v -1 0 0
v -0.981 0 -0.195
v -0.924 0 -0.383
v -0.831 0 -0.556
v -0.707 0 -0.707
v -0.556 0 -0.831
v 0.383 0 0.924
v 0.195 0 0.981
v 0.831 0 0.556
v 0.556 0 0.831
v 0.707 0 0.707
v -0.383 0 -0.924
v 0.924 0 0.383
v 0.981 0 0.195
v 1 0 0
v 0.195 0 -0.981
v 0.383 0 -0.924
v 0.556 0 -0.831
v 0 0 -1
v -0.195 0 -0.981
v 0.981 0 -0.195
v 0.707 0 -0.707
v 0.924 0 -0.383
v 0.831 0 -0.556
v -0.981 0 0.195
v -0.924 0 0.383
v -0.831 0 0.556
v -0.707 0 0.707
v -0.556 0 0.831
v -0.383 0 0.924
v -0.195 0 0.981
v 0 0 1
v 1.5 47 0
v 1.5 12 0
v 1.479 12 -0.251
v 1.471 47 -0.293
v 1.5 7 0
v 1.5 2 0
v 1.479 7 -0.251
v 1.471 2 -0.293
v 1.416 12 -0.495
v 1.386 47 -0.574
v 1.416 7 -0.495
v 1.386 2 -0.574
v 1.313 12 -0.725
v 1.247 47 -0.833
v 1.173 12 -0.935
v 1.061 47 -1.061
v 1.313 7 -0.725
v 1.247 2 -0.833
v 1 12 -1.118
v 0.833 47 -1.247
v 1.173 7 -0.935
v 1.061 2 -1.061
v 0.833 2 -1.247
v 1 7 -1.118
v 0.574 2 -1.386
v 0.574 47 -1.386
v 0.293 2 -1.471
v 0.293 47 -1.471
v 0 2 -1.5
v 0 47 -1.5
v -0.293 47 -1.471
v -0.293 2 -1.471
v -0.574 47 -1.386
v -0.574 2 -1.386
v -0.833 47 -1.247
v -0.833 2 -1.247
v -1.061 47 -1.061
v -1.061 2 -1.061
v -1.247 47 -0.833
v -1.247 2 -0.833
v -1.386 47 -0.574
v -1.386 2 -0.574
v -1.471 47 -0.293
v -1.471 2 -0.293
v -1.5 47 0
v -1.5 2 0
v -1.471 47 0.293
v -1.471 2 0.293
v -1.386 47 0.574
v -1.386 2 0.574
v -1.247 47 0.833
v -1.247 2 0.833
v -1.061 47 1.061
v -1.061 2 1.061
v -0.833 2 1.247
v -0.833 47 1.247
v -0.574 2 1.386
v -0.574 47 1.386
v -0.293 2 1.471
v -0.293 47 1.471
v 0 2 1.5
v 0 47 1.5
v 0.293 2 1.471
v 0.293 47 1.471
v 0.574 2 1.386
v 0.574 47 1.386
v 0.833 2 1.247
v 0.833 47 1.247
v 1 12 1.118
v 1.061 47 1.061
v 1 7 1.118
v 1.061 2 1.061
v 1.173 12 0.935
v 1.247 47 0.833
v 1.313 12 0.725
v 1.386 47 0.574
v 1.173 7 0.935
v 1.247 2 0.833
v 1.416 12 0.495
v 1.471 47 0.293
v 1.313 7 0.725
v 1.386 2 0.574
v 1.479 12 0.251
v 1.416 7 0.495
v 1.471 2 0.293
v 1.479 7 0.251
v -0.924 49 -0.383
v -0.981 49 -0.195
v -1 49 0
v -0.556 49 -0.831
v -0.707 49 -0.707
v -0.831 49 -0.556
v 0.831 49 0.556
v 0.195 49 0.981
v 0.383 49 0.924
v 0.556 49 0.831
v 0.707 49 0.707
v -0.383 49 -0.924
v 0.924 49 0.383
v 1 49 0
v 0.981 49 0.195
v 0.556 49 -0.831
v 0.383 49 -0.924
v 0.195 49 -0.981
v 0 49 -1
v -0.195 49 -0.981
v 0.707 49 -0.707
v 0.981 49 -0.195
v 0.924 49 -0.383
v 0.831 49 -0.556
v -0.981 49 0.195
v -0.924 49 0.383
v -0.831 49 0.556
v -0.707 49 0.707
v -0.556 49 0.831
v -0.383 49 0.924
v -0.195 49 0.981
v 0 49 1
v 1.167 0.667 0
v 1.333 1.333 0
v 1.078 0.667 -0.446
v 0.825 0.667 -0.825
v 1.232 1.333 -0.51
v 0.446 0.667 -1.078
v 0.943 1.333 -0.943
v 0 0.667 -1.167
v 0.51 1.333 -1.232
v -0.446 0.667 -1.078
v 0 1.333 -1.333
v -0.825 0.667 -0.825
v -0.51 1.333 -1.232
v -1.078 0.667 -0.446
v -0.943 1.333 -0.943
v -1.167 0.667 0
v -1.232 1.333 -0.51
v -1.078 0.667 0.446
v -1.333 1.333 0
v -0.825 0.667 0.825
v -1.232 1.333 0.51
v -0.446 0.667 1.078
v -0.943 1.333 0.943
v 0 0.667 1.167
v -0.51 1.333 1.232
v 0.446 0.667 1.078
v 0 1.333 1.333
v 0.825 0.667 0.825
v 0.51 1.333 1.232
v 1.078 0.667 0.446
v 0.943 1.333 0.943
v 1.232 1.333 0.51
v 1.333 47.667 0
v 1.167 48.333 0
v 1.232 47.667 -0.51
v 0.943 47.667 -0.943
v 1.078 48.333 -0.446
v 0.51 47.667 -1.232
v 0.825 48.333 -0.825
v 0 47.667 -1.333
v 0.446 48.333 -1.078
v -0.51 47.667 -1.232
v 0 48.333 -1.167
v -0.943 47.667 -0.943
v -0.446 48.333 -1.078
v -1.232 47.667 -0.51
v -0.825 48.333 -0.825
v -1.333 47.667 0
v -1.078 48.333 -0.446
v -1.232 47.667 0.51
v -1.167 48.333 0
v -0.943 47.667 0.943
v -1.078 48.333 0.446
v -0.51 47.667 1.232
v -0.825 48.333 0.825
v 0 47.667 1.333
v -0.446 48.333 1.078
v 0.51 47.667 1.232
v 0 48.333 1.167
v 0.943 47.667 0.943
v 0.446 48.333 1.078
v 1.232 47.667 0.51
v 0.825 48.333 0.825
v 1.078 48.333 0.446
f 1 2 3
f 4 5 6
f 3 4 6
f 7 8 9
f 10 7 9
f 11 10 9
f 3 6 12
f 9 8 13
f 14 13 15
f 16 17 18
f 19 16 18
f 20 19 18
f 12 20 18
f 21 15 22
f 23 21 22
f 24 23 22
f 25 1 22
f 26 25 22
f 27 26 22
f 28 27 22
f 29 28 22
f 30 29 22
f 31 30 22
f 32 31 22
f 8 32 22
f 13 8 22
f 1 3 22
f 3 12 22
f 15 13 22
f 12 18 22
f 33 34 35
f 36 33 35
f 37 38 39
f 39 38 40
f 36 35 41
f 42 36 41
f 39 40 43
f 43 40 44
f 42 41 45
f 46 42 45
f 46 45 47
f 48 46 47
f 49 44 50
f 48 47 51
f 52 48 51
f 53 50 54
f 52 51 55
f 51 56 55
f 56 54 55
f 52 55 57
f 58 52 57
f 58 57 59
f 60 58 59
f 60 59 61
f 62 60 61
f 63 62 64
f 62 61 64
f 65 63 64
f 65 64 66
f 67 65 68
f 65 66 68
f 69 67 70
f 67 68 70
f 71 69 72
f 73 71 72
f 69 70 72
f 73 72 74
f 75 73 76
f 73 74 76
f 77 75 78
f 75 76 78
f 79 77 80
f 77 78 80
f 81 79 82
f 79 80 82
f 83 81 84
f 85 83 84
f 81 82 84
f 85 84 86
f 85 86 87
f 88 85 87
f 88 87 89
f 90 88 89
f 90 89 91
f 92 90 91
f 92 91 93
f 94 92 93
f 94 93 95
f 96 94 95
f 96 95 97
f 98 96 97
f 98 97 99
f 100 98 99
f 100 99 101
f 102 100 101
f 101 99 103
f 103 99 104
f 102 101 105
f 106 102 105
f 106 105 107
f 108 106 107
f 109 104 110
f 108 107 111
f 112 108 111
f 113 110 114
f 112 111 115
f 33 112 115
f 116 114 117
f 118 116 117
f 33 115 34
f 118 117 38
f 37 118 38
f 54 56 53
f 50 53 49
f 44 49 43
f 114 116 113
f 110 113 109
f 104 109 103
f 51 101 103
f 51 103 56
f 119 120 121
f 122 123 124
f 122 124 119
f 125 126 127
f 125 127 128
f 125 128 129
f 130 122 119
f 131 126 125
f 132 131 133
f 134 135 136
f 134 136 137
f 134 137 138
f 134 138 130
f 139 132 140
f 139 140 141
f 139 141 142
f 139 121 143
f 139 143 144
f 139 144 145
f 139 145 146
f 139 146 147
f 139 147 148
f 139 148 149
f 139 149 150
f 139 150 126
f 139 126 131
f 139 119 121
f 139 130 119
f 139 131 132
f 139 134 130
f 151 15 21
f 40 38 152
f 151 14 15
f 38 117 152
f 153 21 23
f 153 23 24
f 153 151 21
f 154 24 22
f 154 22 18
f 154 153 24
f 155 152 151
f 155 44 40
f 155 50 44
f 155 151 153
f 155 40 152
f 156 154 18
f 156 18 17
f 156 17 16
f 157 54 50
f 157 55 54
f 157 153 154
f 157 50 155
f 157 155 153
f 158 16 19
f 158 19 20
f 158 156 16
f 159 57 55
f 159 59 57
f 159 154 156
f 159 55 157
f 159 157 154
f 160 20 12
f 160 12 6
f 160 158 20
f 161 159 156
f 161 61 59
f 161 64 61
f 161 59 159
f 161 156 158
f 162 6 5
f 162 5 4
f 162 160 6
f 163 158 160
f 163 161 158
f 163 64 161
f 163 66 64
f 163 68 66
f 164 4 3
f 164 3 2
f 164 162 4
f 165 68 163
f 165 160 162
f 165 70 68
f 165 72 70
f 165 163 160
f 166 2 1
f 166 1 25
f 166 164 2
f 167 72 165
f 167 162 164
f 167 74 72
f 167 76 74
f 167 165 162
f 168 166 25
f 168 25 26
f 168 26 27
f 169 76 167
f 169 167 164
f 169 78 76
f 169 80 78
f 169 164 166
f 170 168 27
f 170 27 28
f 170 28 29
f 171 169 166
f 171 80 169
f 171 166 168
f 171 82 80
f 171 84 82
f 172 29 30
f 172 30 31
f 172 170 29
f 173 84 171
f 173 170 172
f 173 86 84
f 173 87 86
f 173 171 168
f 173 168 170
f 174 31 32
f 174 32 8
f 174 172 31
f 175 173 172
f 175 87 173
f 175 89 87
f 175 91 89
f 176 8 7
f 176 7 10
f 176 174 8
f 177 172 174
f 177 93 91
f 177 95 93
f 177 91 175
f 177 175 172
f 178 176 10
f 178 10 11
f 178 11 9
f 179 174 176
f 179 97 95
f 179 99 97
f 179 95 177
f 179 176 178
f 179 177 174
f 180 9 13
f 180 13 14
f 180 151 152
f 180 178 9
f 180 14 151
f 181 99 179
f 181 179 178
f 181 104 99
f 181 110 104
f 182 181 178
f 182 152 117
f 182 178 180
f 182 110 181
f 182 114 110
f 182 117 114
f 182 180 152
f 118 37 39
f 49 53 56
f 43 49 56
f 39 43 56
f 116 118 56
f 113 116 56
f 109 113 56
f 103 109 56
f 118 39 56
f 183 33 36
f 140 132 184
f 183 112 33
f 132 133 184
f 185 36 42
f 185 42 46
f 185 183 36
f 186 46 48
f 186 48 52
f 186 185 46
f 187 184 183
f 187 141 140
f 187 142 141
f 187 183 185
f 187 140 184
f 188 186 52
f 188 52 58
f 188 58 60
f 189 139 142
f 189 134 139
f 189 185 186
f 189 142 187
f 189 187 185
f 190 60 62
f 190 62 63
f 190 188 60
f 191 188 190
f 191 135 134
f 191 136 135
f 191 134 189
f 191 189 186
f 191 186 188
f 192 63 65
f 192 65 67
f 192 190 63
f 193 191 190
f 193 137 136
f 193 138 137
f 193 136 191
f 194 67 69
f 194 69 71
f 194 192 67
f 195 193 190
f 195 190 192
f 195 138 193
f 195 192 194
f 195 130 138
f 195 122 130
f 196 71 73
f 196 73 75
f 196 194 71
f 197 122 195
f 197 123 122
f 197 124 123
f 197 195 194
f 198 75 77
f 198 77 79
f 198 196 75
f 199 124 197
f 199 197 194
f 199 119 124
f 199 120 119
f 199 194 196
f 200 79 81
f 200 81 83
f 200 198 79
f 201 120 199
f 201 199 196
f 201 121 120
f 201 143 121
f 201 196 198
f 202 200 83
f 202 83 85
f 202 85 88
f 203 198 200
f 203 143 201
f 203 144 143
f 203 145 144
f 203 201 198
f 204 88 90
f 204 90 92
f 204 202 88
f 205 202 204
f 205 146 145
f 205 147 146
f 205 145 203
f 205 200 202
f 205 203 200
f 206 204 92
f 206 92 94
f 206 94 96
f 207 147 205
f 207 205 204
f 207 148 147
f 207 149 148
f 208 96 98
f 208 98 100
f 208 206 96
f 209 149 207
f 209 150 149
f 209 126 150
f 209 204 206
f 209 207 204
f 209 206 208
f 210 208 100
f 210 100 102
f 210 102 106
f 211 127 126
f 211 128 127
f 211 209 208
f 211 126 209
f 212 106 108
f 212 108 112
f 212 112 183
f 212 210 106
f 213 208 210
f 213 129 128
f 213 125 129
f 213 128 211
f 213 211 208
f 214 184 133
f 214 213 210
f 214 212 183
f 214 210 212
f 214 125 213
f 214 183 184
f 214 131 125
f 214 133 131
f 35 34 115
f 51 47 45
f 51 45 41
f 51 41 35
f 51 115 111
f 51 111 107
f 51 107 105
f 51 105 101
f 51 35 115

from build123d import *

# Parameters (mm, degrees)
SKETCH1_R           = 1.5
BOSS_EXTRUDE1_DEPTH = 49
CHAMFER1_SIZE       = 0.5
CHAMFER1_SIZE2      = 2
CHAMFER2_SIZE       = 2
CHAMFER2_SIZE2      = 0.5
SKETCH2_W           = 6
SKETCH2_H           = 5
CUT_EXTRUDE1_DEPTH  = 0.5


with BuildPart() as part:
    # Sketch1 → Boss-Extrude1 (new body)
    with BuildSketch(Plane(origin=(0, 0, 0), x_dir=(1, 0, 0), z_dir=(0, 1, 0))):
        Circle(SKETCH1_R)
    extrude(amount=BOSS_EXTRUDE1_DEPTH)

    # Chamfer1
    chamfer1_edges = [part.edges().sort_by_distance(p)[0] for p in [
        (-1.5, 0, 0),
    ]]
    chamfer1_side = [part.faces().sort_by_distance(p)[0] for p in [
        (0, 0, 0),
    ]]
    chamfer(chamfer1_edges, length=CHAMFER1_SIZE, length2=CHAMFER1_SIZE2, reference=chamfer1_side[0])

    # Chamfer2
    chamfer2_edges = [part.edges().sort_by_distance(p)[0] for p in [
        (-1.5, 49, 0),
    ]]
    chamfer2_side = [part.faces().sort_by_distance(p)[0] for p in [
        (-1.5, 25.5, 0),
    ]]
    chamfer(chamfer2_edges, length=CHAMFER2_SIZE, length2=CHAMFER2_SIZE2, reference=chamfer2_side[0])

    # Sketch2 → Cut-Extrude1 (cut)
    with BuildSketch(Plane(origin=(1.5, 0, 0), x_dir=(0, 0, -1), z_dir=(1, 0, 0))):
        with Locations((0, 9.5)):
            Rectangle(SKETCH2_W, SKETCH2_H)
    extrude(amount=-CUT_EXTRUDE1_DEPTH, mode=Mode.SUBTRACT)


solid = part.part
